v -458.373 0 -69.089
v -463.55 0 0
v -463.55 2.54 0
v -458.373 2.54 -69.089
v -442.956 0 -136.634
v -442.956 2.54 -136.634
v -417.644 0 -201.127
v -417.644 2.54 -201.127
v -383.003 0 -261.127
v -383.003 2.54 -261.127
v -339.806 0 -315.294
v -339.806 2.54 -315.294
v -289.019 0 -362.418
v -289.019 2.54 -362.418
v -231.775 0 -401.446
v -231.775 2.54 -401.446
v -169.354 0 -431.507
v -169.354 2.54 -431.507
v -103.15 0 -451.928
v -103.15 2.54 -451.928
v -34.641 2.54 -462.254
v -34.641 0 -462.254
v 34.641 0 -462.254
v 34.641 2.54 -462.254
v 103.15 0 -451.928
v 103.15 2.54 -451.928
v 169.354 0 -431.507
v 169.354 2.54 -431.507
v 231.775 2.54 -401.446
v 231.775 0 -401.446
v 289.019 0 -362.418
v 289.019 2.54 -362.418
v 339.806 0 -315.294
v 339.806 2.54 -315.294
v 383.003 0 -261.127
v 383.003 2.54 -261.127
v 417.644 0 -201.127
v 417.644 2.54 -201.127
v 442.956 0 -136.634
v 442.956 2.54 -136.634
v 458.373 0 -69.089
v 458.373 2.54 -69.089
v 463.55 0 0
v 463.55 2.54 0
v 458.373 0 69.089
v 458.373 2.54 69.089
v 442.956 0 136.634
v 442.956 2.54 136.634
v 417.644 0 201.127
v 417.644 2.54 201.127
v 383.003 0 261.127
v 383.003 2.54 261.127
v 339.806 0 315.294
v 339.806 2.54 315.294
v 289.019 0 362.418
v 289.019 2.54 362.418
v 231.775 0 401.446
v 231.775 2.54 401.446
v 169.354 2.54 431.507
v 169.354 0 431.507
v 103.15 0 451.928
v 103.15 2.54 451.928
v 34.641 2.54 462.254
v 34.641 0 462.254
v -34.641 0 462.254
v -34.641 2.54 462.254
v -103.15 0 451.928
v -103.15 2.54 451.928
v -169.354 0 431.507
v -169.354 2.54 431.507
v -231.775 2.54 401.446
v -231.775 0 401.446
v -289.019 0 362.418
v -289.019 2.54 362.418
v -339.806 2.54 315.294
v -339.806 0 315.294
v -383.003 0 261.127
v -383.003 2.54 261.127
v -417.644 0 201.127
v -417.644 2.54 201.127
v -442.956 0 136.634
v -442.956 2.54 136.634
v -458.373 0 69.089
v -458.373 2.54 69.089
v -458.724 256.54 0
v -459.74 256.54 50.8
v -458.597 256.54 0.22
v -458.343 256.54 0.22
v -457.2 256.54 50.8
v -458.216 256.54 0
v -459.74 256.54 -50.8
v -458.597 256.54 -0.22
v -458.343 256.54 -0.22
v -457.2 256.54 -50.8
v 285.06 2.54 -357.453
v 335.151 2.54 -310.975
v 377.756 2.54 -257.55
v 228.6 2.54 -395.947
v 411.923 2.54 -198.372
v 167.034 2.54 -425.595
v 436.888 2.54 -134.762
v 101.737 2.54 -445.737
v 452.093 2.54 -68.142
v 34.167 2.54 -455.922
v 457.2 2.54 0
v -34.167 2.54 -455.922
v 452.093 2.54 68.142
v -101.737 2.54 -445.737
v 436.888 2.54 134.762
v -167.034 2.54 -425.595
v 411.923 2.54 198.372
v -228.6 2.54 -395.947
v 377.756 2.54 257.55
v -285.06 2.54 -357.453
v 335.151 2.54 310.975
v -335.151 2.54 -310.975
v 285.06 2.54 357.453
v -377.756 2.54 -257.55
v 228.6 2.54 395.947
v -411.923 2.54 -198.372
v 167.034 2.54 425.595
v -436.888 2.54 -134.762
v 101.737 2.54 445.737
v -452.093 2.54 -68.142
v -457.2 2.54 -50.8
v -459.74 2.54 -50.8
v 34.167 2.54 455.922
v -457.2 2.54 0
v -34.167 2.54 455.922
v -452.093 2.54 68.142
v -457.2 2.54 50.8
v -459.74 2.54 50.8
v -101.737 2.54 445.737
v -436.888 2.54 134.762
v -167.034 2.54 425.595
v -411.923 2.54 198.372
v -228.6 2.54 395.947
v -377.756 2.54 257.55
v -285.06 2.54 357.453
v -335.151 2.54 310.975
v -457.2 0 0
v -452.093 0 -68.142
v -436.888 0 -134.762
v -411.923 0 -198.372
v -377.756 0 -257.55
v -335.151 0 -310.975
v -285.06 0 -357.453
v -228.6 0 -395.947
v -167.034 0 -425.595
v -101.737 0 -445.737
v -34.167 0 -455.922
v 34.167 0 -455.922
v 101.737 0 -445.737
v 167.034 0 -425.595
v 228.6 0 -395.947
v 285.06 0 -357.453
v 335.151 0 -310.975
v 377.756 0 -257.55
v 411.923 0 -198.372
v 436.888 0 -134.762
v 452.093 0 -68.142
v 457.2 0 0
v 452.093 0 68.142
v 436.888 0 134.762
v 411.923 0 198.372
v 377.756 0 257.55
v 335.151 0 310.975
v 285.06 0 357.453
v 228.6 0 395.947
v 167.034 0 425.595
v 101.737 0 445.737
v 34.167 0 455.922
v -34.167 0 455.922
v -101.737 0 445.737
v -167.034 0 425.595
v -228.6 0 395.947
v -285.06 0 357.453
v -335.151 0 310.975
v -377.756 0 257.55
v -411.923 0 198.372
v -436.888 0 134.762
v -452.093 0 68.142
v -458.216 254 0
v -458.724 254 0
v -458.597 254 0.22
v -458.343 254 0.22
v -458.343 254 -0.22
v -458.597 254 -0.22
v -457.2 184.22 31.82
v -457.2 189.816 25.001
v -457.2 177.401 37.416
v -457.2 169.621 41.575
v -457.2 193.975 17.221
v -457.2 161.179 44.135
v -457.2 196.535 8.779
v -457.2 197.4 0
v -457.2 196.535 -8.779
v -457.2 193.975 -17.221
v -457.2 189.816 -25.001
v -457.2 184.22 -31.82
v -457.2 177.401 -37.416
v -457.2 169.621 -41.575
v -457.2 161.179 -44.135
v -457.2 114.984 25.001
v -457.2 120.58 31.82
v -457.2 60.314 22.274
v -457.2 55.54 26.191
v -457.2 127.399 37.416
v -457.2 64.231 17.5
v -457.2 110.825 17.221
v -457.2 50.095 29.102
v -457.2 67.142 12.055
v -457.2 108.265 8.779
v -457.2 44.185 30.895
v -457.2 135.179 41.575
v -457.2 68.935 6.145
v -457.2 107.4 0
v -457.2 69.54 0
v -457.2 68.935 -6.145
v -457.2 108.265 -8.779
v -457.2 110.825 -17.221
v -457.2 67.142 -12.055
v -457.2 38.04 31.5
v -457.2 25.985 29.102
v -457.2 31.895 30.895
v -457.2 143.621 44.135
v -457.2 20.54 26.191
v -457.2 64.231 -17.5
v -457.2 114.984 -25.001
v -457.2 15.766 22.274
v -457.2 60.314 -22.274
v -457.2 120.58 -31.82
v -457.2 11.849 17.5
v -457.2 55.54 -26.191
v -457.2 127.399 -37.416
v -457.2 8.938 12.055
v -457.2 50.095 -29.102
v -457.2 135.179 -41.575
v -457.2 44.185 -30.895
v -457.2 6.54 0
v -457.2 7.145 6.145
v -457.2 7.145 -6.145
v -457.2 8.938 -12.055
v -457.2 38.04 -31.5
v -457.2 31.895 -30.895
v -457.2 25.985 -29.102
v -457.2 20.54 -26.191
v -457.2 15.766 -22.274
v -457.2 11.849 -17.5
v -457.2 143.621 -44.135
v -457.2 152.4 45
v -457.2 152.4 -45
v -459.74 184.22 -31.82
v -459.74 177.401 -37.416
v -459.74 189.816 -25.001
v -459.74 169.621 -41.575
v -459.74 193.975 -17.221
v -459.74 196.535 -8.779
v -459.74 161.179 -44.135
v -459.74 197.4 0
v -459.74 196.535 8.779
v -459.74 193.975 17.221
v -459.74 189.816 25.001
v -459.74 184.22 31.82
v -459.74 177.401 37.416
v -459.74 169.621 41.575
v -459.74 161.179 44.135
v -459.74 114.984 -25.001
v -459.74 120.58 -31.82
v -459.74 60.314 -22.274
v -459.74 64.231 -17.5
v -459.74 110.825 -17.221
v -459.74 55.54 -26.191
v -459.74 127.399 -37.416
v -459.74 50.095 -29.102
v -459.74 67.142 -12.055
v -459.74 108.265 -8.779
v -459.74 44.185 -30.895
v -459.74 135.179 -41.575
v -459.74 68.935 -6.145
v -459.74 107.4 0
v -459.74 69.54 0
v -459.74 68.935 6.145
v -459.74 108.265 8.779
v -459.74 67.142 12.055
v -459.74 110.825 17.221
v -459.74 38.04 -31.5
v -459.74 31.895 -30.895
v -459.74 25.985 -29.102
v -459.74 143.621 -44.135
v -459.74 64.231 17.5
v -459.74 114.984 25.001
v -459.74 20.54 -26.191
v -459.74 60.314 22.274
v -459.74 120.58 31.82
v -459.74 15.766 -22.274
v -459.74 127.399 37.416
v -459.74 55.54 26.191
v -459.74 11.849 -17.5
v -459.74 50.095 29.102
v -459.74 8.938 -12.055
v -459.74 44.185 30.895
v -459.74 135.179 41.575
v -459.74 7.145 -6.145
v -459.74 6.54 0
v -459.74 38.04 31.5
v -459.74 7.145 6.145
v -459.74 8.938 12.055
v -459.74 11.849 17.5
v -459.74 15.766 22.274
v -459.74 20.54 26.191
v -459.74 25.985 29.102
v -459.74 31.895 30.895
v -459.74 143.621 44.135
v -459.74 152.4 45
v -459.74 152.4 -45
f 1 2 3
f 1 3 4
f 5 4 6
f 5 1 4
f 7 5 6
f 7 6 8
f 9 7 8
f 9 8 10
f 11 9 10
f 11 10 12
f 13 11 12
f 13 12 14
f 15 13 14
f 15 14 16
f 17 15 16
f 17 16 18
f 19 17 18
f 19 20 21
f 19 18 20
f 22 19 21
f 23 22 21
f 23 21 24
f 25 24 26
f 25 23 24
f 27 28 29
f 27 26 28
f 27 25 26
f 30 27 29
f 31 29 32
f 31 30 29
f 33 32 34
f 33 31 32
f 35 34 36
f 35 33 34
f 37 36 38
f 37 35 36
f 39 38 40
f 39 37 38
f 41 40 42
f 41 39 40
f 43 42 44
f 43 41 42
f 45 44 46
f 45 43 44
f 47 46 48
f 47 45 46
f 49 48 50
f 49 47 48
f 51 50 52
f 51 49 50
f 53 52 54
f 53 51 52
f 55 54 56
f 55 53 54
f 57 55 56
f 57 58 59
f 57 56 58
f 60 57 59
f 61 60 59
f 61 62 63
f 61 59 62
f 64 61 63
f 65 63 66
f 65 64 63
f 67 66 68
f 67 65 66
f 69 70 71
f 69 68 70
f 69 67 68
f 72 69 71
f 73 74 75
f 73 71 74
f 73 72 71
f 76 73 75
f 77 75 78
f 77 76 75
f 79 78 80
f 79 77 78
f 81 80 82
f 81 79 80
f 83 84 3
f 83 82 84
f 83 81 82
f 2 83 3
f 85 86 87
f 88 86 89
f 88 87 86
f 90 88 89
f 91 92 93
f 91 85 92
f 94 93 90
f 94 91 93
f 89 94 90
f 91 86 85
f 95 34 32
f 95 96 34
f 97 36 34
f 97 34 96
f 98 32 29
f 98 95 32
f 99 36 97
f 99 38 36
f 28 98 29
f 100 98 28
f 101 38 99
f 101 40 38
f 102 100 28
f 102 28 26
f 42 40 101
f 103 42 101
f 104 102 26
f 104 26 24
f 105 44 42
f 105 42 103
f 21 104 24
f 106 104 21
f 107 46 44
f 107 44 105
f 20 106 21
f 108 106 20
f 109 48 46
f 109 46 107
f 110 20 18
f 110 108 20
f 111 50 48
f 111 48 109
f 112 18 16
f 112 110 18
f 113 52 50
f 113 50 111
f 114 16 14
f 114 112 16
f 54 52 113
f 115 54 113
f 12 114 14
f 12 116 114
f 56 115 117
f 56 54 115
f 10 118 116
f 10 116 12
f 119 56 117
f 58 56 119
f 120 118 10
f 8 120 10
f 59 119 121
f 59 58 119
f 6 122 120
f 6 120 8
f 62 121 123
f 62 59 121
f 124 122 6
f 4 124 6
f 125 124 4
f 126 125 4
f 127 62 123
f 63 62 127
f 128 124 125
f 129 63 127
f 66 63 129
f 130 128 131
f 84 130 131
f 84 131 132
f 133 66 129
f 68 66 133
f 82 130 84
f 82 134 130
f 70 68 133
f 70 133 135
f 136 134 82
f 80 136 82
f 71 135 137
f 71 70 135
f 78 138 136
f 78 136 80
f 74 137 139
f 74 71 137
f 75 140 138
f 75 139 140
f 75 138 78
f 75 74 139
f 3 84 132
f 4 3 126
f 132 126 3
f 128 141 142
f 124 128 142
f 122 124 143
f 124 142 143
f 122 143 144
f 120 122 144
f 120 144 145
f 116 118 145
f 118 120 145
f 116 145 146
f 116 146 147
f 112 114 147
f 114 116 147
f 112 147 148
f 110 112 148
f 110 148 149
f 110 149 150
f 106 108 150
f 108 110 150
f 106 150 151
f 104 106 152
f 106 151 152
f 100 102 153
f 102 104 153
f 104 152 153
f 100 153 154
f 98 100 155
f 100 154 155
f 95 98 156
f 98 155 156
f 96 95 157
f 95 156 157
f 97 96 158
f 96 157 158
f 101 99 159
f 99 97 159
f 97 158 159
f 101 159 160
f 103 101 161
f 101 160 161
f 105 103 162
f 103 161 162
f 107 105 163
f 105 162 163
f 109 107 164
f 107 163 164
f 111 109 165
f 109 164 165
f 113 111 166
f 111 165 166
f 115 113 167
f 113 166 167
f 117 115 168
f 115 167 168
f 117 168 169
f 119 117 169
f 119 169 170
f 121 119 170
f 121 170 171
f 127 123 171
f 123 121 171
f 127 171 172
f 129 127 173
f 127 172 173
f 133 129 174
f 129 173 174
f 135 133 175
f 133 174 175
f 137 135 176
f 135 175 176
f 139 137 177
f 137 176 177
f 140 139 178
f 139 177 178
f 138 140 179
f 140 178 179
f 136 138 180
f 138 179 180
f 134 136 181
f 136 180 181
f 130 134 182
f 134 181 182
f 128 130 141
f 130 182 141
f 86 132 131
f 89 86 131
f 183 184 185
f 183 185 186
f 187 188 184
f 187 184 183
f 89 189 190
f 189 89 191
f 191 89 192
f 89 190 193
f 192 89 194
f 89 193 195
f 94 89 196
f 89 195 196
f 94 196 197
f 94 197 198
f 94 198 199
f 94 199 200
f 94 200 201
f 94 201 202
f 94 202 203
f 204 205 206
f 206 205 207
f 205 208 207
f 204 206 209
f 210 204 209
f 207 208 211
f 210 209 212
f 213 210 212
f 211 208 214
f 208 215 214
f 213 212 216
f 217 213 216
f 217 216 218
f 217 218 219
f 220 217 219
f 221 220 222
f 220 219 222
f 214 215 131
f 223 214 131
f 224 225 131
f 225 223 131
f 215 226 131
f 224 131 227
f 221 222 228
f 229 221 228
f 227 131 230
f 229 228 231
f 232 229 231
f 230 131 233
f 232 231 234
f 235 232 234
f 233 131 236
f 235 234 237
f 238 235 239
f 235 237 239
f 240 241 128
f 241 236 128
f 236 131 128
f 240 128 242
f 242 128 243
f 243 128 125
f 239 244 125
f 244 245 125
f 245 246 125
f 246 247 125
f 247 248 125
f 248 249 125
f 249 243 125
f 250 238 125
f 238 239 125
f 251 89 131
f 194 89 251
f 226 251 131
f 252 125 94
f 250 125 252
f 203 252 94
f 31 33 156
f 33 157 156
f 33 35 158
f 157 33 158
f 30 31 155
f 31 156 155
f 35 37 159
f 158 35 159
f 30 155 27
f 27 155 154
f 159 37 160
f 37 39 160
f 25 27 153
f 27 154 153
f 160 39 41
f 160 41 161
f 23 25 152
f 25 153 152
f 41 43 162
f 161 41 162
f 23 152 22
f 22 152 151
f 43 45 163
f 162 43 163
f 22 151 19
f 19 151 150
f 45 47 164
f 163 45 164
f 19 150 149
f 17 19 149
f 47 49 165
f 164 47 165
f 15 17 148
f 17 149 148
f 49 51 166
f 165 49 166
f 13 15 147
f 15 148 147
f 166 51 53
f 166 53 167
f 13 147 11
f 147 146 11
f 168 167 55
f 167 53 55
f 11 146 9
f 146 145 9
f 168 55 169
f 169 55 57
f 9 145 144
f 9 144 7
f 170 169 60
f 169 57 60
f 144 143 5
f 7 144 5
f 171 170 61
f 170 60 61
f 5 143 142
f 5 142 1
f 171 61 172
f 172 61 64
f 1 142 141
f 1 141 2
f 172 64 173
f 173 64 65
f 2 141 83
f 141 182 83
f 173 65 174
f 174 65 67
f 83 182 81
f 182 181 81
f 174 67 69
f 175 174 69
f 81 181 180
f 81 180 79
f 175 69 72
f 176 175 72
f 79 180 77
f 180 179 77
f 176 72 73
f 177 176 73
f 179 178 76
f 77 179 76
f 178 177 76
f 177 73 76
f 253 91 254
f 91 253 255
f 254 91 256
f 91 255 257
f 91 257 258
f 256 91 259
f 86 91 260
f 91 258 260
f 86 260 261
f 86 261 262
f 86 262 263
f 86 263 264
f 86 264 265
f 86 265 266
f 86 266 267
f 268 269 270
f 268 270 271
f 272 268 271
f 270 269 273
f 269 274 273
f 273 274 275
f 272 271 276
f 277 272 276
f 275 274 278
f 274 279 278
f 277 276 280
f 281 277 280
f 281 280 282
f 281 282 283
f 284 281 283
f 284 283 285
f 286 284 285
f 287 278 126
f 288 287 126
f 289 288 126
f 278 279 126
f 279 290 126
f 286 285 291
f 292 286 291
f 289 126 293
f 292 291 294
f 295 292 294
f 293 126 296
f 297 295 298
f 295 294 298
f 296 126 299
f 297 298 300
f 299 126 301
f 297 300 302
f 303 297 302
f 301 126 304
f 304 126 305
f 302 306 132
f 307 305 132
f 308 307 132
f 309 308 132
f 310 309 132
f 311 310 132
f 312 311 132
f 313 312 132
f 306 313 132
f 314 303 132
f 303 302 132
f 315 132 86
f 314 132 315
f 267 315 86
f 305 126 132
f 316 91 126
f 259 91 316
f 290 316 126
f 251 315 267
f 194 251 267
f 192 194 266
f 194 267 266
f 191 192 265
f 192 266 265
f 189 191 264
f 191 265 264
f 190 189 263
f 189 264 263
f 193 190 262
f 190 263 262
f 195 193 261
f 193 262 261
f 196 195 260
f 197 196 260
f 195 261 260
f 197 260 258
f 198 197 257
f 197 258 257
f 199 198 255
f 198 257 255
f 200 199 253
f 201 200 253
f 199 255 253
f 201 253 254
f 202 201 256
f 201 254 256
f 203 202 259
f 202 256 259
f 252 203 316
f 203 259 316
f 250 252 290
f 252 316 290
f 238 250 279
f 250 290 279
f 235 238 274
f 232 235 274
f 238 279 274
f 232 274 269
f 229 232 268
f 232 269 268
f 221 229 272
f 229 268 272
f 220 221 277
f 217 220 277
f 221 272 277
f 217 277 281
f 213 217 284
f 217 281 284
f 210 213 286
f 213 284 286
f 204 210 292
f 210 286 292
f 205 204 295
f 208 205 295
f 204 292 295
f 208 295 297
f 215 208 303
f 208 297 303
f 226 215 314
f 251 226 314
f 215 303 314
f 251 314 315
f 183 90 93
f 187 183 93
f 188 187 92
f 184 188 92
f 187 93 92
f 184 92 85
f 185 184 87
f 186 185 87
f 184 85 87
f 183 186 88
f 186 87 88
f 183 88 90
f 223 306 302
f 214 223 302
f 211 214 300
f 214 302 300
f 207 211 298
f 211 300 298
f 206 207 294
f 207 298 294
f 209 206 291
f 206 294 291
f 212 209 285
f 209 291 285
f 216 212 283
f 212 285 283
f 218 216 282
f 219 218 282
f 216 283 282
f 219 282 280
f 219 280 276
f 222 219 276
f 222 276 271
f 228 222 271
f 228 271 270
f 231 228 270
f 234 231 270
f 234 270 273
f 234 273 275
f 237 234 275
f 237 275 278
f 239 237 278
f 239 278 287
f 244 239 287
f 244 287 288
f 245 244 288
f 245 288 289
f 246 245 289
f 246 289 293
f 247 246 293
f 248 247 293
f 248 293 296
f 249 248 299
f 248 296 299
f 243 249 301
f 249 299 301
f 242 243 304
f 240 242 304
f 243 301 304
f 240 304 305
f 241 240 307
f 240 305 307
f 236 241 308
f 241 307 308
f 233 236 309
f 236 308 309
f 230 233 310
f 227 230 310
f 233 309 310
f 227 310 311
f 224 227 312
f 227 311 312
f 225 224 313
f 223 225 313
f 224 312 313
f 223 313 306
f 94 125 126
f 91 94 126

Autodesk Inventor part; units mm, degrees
ref_plane "YZ Plane" through (0, 0, 0) normal (1, 0, 0) x (0, 1, 0)
ref_plane "XZ Plane" through (0, 0, 0) normal (0, 1, 0) x (-1, 0, 0)
ref_plane "XY Plane" through (0, 0, 0) normal (0, 0, 1) x (1, 0, 0)
sketch "Sketch1" plane through (0, 0, 0) normal (0, 1, 0) x (-1, 0, 0)
  circle A0 centre (0, 0) radius 457.2
  circle A1 centre (0, 0) radius 463.55
  dimension "d0" = 914.4
  dimension "d1" = 6.35
extrude "Extrusion1" add sketch "Sketch1" along normal blind 2.54
sketch "Sketch2" plane through (0, 2.54, 0) normal (0, 1, 0) x (1, 0, 0)
  line L0 (-459.74, -50.8) -> (-457.2, -50.8)
  line L1 (-457.2, -50.8) -> (-457.2, 50.8)
  line L2 (-457.2, 50.8) -> (-459.74, 50.8)
  line L3 (-459.74, 50.8) -> (-459.74, -50.8)
  line L4 (-459.74, 0) -> (-457.2, 0) construction
  dimension "d4" = 2.54
  dimension "d5" = 101.6
extrude "Extrusion2" add sketch "Sketch2" along normal blind 254
sketch "Sketch3" plane through (0, 256.54, 0) normal (0, 1, 0) x (1, 0, 0)
  circle A0 centre (-458.47, 0) radius 0.254
  point P0 (0, 0)
  dimension "d8" = 0.508
extrude "Extrusion3" cut sketch "Sketch3" against normal blind 2.54
sketch "Sketch4" plane through (-459.74, 2.54, -50.8) normal (-1, 0, 0) x (0, 0, 1)
  line L0 (0, 254) -> (101.6, 254) projected
  circle A0 centre (50.8, 149.86) radius 45
  circle A1 centre (50.8, 35.5) radius 31.5
  point P0 (50.8, -2.54)
  dimension "d11" = 90
  dimension "d12" = 104.14
  dimension "d13" = 63
  dimension "d14" = 218.5
extrude "Extrusion4" cut sketch "Sketch4" against normal through all
equation "\"d0\" = hubOuterDiam"
equation "\"d11\" = sleeveOD"
equation "\"d13\" = sparOD"
equation "\"hubOuterDiam\" = 914.4"
equation "\"hubInnerDiam\" = 0.5 * hubOuterDiam"
equation "\"sleeveOD\" = 90"
equation "\"sparOD\" = 63"
properties part number "hubGuideRingOuter" material "Gold"
